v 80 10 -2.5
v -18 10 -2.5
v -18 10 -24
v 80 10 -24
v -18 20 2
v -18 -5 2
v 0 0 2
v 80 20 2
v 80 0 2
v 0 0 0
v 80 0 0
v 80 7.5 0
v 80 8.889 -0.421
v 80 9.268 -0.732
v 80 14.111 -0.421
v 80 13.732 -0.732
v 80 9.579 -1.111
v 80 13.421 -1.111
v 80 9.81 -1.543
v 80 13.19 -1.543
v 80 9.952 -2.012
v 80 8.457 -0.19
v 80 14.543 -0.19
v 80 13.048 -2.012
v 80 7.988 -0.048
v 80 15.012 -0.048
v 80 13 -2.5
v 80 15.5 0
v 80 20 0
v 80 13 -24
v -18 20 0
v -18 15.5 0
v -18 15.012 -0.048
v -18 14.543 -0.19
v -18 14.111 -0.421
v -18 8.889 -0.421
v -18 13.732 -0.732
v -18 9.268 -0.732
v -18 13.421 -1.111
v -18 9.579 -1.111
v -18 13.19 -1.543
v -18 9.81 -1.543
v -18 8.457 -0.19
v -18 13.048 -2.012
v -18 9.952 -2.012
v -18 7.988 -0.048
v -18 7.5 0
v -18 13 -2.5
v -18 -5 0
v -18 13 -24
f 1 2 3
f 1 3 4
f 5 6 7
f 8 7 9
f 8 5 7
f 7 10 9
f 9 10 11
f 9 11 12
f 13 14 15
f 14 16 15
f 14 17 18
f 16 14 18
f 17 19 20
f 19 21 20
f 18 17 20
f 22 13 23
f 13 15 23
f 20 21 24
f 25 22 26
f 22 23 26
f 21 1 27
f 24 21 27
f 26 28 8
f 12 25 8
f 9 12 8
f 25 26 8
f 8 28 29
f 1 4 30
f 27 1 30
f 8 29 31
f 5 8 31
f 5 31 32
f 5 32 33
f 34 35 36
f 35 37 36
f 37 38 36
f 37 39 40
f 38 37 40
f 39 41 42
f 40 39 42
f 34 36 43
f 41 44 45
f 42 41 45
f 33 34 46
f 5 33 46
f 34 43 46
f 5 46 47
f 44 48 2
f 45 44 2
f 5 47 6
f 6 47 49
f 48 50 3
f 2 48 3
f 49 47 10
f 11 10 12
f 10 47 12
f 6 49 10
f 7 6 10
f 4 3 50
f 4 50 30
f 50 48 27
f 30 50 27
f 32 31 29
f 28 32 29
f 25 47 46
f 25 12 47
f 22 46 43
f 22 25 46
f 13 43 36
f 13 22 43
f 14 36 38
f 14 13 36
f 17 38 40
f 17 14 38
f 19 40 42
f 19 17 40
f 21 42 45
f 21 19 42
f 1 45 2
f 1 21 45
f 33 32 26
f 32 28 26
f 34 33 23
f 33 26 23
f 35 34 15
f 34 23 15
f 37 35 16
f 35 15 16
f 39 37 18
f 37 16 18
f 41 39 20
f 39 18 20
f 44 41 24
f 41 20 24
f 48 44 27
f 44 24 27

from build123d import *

# Parameters (mm, degrees)
F0_W     = 80
F0_H     = 20
F1_DEPTH = 2
F2_W     = 98
F2_H     = 3
F3_DEPTH = 24
F4_R     = 2.5


with BuildPart() as f1:
    # F0 (on Top) → F1 (new body)
    with BuildSketch(Plane.XY):
        with Locations((40, 10)):
            Rectangle(F0_W, F0_H)
        Polygon((-18, -5), (0, 0), (0, 20), (-18, 20), align=None)
    extrude(amount=F1_DEPTH)

    # F2 (on face) → F3 (join)
    with BuildSketch(Plane(origin=(0, 0, 0), x_dir=(1, 0, 0), z_dir=(0, 0, -1))):
        with Locations((31, -11.5)):
            Rectangle(F2_W, F2_H)
    extrude(amount=F3_DEPTH)

    # F4
    f4_edges = [f1.edges().sort_by_distance(p)[0] for p in [
        (31, 10, 0),
        (31, 13, 0),
    ]]
    fillet(f4_edges, radius=F4_R)


solid = f1.part
